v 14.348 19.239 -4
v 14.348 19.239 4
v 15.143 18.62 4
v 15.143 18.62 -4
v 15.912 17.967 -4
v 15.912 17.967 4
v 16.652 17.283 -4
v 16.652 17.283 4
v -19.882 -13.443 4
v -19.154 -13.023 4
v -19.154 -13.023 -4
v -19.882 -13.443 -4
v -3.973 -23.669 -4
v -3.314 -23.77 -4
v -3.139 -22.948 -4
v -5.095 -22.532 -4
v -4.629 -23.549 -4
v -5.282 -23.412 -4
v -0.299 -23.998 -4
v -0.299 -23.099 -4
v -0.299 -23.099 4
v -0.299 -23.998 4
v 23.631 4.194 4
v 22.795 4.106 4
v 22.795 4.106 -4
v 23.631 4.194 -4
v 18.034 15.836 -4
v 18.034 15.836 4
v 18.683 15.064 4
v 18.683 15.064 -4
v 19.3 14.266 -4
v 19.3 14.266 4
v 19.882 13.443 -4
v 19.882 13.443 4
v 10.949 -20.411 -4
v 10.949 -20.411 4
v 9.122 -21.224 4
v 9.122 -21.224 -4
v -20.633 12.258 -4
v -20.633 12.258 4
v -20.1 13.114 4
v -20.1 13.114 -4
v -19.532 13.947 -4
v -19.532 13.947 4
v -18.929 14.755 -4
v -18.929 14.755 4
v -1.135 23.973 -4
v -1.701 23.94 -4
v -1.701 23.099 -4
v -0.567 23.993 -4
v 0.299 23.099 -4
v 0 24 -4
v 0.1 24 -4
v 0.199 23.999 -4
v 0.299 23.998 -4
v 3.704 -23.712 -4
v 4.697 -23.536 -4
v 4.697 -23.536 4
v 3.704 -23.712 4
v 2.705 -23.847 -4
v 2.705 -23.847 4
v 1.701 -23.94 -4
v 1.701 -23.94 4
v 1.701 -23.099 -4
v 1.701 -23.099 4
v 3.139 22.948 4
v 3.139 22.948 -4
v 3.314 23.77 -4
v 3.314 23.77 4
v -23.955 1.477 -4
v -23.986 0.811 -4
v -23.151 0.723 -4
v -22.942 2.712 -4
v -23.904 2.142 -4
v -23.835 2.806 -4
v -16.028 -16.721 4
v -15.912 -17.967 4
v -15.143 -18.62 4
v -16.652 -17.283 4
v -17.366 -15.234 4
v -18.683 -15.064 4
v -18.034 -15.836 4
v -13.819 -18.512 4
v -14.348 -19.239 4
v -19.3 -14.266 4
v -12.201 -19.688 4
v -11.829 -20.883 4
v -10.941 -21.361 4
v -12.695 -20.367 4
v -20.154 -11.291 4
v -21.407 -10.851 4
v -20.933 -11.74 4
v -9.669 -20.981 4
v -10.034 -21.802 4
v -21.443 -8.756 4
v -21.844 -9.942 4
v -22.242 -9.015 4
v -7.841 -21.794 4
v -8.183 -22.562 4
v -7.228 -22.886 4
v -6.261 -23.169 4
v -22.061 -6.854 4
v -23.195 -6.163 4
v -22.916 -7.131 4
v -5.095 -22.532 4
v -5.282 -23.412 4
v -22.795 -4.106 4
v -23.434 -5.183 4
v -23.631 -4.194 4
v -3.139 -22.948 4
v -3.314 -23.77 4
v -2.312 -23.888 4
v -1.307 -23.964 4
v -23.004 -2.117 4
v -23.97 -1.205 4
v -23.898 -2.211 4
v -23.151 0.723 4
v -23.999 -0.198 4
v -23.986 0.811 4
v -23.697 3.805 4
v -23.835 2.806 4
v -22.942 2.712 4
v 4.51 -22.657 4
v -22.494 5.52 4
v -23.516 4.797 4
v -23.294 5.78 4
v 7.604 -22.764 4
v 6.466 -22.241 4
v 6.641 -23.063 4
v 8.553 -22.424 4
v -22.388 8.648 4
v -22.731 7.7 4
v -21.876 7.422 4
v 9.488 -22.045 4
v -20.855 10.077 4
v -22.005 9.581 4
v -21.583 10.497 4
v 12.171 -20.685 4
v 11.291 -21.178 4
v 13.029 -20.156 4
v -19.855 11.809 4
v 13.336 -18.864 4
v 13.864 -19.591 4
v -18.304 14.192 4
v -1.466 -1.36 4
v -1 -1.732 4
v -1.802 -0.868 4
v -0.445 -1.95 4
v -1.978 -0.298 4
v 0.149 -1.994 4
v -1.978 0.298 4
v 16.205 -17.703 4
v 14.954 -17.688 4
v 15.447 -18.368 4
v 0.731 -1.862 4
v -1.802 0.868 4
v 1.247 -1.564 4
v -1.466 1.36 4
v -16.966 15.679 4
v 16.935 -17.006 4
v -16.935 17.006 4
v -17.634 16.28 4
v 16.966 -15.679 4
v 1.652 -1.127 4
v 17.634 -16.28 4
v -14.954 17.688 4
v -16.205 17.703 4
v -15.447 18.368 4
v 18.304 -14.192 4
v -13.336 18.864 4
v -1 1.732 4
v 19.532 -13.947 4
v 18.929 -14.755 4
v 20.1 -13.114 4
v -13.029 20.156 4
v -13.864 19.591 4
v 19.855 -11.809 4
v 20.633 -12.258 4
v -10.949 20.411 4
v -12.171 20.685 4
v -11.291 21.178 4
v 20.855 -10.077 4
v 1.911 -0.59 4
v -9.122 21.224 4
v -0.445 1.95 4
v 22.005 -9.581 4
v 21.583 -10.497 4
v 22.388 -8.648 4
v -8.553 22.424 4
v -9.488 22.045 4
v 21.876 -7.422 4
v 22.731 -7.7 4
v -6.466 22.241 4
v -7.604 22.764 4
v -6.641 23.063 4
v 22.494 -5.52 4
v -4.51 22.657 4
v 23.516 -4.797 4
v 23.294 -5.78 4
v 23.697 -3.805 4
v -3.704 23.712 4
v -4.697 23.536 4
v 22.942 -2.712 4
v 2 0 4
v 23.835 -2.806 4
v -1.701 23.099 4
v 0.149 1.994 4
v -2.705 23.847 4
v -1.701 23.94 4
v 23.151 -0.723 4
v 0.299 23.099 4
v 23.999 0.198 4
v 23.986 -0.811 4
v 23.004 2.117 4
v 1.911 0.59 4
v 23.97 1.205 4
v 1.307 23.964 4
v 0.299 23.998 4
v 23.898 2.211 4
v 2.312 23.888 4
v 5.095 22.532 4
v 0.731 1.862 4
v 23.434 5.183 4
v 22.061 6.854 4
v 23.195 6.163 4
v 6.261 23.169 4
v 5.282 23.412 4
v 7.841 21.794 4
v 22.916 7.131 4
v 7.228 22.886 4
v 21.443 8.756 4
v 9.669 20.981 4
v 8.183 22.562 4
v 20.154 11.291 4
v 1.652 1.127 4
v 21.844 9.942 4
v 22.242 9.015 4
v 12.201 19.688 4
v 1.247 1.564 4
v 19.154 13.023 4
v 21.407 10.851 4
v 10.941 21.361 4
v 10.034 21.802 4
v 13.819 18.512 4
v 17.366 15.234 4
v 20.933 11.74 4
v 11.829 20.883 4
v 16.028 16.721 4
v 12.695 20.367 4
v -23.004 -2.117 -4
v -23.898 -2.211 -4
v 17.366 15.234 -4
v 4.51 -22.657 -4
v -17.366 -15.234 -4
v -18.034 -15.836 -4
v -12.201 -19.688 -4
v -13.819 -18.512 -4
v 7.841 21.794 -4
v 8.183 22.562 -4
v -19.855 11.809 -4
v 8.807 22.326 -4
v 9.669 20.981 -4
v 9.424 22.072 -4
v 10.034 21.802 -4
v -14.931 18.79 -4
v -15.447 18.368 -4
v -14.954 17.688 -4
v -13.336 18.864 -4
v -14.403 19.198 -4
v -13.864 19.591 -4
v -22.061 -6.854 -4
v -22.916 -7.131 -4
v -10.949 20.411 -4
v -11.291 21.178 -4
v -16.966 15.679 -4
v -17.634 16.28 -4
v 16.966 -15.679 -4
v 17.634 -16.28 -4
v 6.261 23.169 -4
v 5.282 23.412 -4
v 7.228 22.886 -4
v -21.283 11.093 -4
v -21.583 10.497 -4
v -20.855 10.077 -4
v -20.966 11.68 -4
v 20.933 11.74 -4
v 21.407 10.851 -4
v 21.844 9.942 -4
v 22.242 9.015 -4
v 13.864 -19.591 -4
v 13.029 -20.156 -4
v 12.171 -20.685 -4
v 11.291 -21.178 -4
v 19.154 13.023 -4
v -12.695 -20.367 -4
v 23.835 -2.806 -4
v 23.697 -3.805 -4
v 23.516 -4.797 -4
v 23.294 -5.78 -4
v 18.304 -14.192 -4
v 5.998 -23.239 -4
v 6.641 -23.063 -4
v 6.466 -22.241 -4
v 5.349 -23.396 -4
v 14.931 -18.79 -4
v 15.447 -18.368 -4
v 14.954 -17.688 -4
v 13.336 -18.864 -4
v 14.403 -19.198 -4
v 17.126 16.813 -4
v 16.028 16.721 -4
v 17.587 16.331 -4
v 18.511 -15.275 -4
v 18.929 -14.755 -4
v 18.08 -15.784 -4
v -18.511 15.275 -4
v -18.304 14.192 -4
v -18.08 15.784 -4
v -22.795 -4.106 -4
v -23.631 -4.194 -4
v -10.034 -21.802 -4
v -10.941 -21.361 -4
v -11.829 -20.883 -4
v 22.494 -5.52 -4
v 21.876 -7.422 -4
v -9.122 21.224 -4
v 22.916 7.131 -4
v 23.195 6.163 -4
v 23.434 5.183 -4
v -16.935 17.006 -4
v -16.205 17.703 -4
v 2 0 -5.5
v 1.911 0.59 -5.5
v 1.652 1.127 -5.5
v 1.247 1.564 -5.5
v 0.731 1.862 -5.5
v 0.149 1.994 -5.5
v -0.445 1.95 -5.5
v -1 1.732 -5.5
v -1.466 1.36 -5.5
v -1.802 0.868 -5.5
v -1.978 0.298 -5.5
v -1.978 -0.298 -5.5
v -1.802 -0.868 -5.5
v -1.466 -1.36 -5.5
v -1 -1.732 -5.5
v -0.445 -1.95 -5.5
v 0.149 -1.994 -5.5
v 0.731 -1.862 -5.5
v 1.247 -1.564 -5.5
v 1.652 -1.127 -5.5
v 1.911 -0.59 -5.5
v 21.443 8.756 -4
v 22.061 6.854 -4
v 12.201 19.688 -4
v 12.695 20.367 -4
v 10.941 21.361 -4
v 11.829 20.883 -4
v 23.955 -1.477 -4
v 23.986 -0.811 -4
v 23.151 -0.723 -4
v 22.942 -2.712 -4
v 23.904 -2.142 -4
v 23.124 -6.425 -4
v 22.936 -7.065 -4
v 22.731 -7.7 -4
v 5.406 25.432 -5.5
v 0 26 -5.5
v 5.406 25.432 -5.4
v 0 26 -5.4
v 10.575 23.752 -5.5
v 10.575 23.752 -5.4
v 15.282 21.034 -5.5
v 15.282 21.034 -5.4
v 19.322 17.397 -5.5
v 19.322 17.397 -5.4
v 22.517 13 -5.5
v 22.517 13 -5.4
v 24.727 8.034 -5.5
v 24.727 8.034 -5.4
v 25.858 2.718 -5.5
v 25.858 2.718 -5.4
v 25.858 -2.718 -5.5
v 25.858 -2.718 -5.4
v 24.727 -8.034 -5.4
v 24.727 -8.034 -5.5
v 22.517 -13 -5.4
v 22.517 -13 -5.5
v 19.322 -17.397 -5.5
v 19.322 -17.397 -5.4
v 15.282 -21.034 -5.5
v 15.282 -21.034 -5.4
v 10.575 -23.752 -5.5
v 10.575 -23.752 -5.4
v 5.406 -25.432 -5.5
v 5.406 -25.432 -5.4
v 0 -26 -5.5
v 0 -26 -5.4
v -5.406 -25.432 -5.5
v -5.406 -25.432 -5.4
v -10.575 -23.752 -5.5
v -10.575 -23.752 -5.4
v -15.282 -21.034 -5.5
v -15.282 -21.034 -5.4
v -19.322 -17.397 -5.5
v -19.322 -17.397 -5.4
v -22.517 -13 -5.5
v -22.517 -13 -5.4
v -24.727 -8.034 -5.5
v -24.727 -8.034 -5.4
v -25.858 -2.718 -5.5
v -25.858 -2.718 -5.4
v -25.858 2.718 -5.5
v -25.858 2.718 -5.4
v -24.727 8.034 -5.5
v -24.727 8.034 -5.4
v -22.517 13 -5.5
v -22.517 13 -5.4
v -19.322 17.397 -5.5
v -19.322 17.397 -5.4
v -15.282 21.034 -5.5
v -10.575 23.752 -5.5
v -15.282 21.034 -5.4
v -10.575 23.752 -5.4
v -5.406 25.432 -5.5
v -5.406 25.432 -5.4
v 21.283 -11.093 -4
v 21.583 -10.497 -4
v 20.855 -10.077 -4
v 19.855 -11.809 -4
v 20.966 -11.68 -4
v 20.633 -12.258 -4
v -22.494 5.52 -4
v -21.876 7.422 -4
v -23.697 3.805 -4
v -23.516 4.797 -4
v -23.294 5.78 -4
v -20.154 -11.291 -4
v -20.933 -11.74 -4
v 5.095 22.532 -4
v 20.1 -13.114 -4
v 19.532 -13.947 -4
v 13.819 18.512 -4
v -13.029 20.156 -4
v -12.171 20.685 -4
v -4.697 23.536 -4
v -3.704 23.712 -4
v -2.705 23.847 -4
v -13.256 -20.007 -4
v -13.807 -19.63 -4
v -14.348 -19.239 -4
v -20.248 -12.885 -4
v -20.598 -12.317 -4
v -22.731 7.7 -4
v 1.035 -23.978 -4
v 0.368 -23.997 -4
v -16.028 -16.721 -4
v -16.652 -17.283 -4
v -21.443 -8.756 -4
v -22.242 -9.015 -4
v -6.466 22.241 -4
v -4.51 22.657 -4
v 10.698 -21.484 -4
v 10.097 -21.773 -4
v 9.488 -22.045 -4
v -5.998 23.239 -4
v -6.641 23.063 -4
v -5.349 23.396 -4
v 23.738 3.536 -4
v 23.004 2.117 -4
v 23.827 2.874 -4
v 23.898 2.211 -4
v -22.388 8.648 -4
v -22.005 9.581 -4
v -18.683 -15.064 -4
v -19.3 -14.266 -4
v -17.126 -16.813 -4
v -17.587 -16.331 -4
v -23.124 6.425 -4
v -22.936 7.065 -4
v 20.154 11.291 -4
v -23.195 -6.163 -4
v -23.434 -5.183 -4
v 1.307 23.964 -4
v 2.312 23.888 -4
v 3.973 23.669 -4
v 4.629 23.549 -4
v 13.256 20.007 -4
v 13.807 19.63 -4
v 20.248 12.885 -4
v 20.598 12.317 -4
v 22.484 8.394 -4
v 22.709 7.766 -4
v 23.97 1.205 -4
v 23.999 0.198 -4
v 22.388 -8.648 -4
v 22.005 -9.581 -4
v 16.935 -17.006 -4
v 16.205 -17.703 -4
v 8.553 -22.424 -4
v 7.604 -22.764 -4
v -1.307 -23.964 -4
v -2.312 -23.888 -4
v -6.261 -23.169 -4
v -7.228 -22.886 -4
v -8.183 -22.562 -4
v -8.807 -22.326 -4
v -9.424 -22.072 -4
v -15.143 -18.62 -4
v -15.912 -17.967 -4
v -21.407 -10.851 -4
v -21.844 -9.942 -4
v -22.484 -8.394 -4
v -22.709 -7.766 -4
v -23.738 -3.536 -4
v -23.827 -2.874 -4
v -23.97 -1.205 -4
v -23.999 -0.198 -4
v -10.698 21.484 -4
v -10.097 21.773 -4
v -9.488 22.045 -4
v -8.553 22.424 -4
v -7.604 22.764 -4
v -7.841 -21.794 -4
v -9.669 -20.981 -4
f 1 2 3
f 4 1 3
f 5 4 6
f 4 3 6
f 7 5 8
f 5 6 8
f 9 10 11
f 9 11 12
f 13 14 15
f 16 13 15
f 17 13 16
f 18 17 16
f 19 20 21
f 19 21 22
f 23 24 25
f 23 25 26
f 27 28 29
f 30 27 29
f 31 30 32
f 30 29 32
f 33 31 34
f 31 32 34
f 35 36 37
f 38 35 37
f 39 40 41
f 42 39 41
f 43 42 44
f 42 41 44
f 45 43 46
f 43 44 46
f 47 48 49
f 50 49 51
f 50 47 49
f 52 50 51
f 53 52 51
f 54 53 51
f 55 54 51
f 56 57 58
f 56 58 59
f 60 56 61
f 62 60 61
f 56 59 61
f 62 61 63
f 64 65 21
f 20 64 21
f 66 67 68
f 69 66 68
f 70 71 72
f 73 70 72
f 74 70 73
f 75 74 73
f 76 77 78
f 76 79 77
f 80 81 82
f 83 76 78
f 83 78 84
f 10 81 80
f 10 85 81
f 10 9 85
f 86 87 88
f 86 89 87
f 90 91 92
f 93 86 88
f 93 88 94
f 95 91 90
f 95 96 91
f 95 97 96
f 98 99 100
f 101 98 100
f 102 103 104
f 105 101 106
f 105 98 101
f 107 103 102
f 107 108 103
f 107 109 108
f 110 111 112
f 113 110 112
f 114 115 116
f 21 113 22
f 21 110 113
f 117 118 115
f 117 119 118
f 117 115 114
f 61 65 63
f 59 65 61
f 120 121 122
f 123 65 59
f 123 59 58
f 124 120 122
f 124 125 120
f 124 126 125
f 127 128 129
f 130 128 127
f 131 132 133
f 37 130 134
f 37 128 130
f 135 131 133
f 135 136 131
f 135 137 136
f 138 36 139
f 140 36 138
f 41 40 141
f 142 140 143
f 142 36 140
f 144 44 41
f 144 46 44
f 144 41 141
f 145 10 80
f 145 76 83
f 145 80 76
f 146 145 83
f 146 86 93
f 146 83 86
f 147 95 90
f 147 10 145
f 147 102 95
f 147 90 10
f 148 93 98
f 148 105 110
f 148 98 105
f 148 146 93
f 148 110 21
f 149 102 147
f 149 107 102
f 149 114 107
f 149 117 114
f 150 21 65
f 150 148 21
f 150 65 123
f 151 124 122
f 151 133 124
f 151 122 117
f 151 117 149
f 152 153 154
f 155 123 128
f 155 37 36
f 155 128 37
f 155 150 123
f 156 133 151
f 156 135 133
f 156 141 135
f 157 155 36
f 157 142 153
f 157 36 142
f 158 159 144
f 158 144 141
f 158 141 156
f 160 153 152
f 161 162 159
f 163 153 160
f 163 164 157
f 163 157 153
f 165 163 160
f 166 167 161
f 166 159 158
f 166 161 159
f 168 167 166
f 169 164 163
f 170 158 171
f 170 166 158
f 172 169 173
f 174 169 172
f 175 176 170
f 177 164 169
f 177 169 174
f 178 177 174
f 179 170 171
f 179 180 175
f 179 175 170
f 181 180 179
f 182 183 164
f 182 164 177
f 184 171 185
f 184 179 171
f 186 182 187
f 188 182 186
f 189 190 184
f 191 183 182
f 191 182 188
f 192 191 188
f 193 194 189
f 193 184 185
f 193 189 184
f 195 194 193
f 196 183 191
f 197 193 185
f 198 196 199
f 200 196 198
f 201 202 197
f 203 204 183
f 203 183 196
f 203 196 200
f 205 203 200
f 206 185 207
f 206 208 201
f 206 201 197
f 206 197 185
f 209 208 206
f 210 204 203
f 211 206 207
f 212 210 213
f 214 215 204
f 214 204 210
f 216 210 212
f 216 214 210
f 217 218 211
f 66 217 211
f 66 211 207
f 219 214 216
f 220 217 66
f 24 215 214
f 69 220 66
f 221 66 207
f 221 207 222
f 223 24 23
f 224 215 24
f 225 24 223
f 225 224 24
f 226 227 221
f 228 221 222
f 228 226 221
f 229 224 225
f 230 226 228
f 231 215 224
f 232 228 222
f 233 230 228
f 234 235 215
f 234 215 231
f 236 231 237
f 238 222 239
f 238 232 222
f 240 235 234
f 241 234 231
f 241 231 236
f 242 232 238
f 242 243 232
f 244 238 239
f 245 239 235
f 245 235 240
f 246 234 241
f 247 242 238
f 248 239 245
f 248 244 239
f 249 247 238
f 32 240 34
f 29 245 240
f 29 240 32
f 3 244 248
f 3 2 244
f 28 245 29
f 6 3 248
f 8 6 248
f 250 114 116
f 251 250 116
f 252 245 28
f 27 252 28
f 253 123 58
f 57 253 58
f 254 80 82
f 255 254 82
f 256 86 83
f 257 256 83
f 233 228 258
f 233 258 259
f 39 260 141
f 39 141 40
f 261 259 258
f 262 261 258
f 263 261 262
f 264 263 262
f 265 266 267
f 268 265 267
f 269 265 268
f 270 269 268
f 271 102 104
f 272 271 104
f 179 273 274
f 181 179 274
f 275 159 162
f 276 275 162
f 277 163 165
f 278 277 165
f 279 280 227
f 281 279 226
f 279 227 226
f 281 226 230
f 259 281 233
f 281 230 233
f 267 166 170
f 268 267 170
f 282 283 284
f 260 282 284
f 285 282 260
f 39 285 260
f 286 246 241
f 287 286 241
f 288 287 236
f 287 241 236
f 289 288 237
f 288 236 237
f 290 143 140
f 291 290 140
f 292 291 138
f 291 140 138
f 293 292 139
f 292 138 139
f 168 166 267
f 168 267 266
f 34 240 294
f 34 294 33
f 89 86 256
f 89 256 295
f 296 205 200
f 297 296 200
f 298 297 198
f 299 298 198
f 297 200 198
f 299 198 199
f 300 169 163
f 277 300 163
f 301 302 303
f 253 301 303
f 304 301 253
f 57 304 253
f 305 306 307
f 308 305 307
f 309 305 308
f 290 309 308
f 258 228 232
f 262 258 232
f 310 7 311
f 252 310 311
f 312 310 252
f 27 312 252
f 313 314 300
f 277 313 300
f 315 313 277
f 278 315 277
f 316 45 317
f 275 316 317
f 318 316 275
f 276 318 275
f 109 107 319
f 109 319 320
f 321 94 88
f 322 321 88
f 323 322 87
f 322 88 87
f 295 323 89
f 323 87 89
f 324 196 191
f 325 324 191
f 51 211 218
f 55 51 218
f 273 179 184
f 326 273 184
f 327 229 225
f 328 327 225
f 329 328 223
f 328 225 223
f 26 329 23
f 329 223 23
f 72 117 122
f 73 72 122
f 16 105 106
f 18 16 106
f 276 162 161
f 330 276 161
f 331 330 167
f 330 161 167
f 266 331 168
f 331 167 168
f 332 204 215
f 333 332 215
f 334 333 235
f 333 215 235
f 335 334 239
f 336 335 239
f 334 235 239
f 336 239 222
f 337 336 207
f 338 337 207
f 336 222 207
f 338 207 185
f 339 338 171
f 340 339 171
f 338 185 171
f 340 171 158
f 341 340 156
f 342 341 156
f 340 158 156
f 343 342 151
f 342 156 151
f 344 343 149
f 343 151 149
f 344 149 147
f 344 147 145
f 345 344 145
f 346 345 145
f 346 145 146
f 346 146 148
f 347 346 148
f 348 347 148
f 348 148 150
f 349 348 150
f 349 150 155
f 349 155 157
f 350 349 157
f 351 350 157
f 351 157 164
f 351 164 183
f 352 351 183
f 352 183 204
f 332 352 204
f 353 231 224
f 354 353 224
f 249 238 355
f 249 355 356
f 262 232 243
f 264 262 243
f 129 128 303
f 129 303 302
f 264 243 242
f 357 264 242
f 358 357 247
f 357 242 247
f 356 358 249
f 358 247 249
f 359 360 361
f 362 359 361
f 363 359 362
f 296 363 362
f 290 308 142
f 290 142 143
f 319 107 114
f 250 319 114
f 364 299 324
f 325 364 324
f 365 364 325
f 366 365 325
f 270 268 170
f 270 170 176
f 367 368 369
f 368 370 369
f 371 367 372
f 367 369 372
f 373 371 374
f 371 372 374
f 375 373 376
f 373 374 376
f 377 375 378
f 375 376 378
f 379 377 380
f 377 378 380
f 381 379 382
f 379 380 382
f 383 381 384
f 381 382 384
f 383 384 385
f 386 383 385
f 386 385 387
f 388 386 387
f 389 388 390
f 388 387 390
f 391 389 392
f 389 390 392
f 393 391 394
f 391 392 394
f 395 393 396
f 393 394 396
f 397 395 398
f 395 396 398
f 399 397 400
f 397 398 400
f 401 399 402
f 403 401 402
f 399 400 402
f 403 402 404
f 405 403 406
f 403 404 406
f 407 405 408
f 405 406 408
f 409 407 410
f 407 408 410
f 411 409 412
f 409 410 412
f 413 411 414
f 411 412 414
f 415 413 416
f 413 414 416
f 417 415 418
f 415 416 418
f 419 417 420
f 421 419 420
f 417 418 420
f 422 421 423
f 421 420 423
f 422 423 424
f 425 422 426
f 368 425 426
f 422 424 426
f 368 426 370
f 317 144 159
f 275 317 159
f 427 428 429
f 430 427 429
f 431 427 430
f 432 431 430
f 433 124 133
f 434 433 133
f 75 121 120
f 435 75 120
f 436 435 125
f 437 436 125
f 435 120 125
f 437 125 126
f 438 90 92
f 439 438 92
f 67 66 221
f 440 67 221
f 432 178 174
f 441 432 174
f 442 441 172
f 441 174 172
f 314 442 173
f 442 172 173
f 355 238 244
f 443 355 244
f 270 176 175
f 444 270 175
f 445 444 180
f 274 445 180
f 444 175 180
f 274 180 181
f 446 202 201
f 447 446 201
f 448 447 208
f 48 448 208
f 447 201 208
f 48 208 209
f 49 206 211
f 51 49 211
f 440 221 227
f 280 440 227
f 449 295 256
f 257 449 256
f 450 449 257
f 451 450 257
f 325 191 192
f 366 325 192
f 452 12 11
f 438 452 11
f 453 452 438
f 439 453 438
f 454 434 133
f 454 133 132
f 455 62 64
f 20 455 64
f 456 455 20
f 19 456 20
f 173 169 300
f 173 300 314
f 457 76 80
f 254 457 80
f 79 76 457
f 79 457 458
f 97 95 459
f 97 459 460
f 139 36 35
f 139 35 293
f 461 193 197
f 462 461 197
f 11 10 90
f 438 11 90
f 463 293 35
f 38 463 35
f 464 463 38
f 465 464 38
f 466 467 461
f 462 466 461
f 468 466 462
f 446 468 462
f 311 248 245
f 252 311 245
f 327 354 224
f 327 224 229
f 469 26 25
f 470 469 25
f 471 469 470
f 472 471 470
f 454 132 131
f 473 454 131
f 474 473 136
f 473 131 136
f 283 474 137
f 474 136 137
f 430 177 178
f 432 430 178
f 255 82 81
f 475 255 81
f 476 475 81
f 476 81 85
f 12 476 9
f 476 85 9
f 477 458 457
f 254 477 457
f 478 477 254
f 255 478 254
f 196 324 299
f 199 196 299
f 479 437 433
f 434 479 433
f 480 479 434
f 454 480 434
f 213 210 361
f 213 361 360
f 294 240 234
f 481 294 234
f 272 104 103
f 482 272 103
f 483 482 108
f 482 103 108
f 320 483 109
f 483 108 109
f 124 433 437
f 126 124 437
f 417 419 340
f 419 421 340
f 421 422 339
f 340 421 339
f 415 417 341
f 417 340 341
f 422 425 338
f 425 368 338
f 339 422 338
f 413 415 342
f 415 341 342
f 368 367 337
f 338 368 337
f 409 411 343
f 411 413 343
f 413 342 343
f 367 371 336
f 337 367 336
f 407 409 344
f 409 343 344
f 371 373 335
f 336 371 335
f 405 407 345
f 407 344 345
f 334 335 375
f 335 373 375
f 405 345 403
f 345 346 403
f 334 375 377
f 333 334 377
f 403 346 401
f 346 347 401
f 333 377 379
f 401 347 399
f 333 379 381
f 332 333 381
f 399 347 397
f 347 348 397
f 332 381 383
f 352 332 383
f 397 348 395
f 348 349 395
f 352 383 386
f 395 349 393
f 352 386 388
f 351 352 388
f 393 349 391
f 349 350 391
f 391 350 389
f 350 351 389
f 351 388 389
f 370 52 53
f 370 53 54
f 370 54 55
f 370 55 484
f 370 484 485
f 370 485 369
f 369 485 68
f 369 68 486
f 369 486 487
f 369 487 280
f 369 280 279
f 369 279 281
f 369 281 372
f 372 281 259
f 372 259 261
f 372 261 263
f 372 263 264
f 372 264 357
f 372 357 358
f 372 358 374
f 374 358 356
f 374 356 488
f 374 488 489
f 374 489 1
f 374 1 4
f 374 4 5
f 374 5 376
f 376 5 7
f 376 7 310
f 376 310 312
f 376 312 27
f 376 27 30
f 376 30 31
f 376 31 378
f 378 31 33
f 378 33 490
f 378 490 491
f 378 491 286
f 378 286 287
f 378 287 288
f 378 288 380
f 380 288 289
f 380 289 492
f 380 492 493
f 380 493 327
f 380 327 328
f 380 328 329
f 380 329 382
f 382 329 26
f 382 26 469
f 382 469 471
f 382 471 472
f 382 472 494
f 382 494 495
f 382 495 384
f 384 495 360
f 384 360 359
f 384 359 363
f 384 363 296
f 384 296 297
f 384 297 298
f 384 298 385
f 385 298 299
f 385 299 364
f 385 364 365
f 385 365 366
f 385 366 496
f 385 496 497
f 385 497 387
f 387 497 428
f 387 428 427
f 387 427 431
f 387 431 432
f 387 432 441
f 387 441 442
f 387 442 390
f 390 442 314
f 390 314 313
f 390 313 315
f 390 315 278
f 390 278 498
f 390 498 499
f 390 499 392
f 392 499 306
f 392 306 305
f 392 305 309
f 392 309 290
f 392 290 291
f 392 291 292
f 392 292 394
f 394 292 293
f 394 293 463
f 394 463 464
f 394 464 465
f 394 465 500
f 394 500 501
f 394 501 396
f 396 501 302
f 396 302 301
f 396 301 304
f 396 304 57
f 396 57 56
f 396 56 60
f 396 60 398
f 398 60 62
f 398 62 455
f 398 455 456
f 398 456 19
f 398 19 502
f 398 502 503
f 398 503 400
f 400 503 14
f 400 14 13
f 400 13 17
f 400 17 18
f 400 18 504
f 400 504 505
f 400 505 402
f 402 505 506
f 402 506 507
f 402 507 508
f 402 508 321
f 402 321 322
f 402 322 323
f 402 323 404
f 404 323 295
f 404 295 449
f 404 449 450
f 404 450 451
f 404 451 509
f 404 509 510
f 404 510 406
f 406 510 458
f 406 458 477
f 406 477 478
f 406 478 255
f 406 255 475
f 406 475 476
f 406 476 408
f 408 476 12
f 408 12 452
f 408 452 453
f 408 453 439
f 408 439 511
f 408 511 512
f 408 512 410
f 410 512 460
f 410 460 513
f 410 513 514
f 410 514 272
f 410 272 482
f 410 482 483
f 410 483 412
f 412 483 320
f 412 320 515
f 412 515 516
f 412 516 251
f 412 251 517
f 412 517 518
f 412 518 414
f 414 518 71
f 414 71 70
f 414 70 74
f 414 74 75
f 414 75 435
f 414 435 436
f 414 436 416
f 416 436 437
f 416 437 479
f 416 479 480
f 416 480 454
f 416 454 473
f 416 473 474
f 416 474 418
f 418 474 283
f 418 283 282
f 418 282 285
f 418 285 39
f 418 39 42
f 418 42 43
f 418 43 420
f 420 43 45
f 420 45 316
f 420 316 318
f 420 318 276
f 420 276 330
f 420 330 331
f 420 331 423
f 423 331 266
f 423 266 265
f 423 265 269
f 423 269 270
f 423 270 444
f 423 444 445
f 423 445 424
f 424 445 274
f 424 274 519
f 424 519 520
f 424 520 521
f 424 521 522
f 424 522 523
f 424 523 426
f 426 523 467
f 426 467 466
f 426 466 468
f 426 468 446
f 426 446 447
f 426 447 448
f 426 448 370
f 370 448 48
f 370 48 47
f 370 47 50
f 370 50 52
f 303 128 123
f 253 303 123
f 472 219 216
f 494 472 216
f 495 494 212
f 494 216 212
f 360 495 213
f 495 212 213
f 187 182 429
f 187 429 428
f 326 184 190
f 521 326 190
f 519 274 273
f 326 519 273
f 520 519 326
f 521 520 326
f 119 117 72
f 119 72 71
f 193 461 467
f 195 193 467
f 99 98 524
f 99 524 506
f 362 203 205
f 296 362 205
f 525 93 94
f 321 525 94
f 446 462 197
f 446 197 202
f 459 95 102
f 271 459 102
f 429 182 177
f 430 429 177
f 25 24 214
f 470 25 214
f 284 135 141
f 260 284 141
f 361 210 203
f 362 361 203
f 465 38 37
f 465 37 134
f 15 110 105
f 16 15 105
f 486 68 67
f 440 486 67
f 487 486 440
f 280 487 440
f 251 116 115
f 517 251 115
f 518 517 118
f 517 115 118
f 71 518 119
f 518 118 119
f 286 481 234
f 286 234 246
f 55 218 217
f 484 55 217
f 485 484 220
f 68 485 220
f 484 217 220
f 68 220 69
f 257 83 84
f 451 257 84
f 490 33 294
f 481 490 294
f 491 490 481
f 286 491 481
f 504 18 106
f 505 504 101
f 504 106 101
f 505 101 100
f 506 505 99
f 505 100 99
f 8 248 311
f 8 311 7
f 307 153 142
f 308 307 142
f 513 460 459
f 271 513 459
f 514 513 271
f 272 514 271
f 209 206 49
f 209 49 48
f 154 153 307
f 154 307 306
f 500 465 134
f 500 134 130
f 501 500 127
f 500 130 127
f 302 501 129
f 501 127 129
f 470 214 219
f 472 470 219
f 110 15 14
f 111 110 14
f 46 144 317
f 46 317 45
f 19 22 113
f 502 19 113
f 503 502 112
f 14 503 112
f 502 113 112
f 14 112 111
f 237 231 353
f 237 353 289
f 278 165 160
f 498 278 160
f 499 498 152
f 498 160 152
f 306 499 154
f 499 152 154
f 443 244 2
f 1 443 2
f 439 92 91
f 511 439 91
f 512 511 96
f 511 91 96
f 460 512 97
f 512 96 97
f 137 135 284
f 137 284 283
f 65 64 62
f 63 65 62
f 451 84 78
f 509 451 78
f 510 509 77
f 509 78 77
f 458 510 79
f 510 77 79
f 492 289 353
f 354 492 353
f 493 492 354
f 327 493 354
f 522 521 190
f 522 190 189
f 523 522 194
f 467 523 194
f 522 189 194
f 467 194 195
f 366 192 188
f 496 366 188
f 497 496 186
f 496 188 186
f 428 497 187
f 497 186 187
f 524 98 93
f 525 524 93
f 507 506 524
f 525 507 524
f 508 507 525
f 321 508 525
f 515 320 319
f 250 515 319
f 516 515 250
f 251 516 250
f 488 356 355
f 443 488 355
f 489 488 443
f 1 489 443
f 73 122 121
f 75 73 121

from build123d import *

# Parameters (mm, degrees)
SKETCH2_R          = 2
CUT_EXTRUDE1_DEPTH = 34
SKETCH3_W          = 2
SKETCH3_H          = 3.810210747
CUT_EXTRUDE2_DEPTH = 4
CIRPATTERN1_COUNT  = 30
SKETCH4_R          = 35.761747599
CUT_EXTRUDE3_DEPTH = 1.5


with BuildPart() as part:
    # Sketch1 → Revolve1 (revolve)
    with BuildSketch(Plane(origin=(0, 0, 0), x_dir=(0, 0, -1), z_dir=(1, 0, 0))):
        Polygon((-5.5, 0), (-5.5, 26), (-5.400415076, 26), (-4, 24), (0, 24), (0, 0), align=None)
    revolve1 = revolve(axis=Axis((0, 0, 5.5), (0, 0, -1)))

    # Mirror1: Revolve1 across plane
    add(revolve1.mirror(Plane.XY))

    # Sketch2 → Cut-Extrude1 (cut)
    with BuildSketch(Plane.XY.offset(5.5)):
        Circle(SKETCH2_R)
    extrude(amount=-CUT_EXTRUDE1_DEPTH, mode=Mode.SUBTRACT)

    # Sketch3 → Cut-Extrude2 (cut, symmetric)
    with BuildSketch(Plane.XY):
        with Locations((-0.70098694, 25.004508025)):
            Rectangle(SKETCH3_W, SKETCH3_H)
    cut_extrude2 = extrude(amount=CUT_EXTRUDE2_DEPTH, both=True, mode=Mode.SUBTRACT)

    # CirPattern1: Cut-Extrude2 ×30 about axis
    cirpattern1_axis = Axis((0, 0, 0), (0, 0, 1))
    for i in range(1, CIRPATTERN1_COUNT):
        add(cut_extrude2.rotate(cirpattern1_axis, i * 360 / CIRPATTERN1_COUNT), mode=Mode.SUBTRACT)

    # Sketch4 → Cut-Extrude3 (cut)
    with BuildSketch(Plane.XY.offset(5.5)):
        Circle(SKETCH4_R)
    extrude(amount=-CUT_EXTRUDE3_DEPTH, mode=Mode.SUBTRACT)


solid = part.part
